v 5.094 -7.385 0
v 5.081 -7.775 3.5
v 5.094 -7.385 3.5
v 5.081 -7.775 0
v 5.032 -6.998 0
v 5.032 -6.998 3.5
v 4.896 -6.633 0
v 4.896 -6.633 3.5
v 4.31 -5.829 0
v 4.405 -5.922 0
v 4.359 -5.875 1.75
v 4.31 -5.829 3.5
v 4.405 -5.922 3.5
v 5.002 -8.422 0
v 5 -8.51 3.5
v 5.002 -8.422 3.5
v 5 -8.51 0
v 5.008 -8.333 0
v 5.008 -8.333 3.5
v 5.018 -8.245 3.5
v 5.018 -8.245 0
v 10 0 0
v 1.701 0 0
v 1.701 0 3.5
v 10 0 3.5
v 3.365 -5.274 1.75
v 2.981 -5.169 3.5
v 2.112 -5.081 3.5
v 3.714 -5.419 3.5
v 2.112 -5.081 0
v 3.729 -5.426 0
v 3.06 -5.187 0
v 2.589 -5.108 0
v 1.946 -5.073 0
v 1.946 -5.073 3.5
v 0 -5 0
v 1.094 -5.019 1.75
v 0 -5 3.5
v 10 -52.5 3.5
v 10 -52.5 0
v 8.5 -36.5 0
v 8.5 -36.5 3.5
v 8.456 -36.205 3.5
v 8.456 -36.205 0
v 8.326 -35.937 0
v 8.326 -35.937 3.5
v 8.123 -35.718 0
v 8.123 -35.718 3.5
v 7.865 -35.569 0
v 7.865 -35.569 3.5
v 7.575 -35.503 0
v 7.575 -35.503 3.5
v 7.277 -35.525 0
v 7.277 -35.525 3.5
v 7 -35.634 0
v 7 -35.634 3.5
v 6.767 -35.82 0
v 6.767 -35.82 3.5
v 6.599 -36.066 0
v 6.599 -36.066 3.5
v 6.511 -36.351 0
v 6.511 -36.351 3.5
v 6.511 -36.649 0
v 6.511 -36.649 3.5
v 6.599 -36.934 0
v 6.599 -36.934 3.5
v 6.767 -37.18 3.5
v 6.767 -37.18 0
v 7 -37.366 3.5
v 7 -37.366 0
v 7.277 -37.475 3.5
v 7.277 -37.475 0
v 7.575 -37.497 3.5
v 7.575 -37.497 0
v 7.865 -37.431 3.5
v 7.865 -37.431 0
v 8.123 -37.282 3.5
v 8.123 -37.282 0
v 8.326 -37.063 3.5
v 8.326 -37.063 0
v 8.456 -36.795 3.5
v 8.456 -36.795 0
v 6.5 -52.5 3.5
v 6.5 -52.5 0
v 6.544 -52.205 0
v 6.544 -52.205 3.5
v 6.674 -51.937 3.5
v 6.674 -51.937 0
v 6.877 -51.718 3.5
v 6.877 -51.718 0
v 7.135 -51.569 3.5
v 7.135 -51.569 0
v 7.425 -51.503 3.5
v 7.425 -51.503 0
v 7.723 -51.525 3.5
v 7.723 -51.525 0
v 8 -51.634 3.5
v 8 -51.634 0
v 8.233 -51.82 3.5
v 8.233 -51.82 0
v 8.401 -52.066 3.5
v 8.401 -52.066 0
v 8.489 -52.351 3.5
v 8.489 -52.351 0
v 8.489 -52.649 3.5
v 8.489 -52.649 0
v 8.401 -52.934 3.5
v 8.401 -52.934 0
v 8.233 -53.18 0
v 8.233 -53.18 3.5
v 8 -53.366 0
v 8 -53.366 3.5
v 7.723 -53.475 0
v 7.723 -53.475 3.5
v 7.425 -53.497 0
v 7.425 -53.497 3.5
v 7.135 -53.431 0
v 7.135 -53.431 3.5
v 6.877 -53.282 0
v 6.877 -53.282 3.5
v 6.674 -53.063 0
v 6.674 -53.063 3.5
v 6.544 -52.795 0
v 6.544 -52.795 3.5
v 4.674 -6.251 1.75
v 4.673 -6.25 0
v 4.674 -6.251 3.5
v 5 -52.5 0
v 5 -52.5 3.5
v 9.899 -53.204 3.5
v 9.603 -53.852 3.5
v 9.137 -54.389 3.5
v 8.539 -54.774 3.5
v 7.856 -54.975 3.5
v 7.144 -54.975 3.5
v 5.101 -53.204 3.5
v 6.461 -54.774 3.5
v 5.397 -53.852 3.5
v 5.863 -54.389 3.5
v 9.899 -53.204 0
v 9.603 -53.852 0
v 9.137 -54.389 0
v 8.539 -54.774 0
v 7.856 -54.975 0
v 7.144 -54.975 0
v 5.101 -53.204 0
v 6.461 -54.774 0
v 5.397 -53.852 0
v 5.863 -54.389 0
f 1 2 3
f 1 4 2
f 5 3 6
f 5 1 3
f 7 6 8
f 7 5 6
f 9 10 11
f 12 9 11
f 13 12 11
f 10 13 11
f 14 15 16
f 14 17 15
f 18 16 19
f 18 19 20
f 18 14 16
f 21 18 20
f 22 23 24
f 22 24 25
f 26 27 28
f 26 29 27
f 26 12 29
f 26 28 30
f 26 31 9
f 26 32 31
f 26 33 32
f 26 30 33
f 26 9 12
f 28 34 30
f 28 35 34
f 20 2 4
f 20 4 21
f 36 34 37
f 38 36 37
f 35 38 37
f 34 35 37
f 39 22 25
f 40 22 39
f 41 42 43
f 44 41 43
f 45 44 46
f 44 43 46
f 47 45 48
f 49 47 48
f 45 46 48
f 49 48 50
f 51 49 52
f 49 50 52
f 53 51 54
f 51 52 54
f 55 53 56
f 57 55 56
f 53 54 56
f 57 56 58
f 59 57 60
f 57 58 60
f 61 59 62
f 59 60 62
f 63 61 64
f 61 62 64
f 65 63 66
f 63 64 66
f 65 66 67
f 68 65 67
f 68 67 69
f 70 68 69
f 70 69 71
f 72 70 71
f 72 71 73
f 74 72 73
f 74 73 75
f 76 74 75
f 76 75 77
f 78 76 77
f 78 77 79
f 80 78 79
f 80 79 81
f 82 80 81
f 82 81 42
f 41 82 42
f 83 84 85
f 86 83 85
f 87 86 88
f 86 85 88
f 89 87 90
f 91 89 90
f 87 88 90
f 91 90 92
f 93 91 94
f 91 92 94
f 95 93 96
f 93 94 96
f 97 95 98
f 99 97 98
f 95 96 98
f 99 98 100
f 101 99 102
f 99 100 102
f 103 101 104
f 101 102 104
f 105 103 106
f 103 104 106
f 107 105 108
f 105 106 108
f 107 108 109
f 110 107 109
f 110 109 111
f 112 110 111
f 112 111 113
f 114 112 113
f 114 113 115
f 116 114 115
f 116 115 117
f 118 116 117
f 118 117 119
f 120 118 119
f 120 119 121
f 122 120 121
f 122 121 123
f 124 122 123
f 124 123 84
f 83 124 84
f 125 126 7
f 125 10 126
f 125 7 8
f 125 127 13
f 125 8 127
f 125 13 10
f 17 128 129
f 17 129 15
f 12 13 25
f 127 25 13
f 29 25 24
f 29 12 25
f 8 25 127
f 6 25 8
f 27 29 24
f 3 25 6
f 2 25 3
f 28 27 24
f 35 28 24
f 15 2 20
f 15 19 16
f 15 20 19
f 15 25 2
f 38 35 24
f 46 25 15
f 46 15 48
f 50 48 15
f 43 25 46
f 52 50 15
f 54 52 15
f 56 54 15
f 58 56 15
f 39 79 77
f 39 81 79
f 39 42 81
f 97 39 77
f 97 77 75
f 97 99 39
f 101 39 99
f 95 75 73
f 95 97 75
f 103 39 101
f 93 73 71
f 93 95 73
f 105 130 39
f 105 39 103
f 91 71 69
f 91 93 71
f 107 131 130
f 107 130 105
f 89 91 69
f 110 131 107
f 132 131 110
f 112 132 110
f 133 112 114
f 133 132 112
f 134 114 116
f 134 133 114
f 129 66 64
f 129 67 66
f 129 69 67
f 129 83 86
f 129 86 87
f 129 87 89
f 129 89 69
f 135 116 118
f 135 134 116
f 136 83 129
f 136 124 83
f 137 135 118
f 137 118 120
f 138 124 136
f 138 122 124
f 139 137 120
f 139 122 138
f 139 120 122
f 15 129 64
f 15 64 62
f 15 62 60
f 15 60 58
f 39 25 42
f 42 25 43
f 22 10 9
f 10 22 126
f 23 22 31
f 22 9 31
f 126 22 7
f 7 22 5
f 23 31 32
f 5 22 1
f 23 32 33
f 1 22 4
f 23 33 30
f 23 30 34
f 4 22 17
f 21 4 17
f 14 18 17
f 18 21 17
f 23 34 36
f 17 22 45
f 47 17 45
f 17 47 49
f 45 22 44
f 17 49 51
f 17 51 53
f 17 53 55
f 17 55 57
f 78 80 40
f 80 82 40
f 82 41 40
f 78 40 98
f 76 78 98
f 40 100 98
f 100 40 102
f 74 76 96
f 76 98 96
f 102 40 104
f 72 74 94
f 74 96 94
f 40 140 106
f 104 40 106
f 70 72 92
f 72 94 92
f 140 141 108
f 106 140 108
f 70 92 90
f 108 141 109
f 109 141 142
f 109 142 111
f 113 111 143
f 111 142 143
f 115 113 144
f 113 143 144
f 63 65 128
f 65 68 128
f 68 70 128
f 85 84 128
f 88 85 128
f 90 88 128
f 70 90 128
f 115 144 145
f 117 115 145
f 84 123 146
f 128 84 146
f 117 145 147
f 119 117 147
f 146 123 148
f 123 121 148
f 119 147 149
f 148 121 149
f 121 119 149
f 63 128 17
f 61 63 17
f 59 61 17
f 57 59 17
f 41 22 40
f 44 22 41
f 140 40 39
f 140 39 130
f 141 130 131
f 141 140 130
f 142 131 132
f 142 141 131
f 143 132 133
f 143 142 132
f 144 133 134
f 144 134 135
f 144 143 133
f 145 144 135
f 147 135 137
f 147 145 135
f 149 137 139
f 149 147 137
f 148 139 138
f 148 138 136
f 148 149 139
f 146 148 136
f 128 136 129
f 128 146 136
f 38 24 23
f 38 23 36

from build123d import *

# Parameters (mm, degrees)
BOSS_EXTRU_1_DEPTH      = 3.5
ESQUISSE3_R             = 1
ENL_V_MAT_EXTRU_1_DEPTH = 4
ESQUISSE4_R             = 1
ENL_V_MAT_EXTRU_2_DEPTH = 10
ENL_V_MAT_EXTRU_3_DEPTH = 57.011159602
CONG_1_SIZE             = 5
CONG_1_SIZE_2           = 3
ENL_V_MAT_EXTRU_7_DEPTH = 6
CONG_4_R                = 2
CONG_5_R                = 2


with BuildPart() as part:
    # Esquisse1 → Boss.-Extru.1 (new body)
    with BuildSketch(Plane.XY):
        with BuildLine():
            Line((0, 0), (10, 0))
            Line((10, 0), (10, -52.5))
            ThreePointArc((10, -52.5), (7.5, -55), (5, -52.5))
            Line((5, -52.5), (5, -5))
            Line((5, -5), (0, -5))
            Line((0, -5), (0, 0))
        make_face()
    extrude(amount=BOSS_EXTRU_1_DEPTH)

    # Esquisse3 → Enlèv. mat.-Extru.1 (cut)
    with BuildSketch(Plane(origin=(0, 0, 0), x_dir=(-1, 0, 0), z_dir=(0, 0, -1))):
        with Locations((-7.5, -52.5)):
            Circle(ESQUISSE3_R)
    extrude(amount=-ENL_V_MAT_EXTRU_1_DEPTH, mode=Mode.SUBTRACT)

    # Esquisse4 → Enlèv. mat.-Extru.2 (cut)
    with BuildSketch(Plane.XY.offset(3.5)):
        with Locations((7.5, -36.5)):
            Circle(ESQUISSE4_R)
    extrude(amount=-ENL_V_MAT_EXTRU_2_DEPTH, mode=Mode.SUBTRACT)

    # Esquisse5 → Enlèv. mat.-Extru.3 (cut, through all)
    with BuildSketch(Plane.XY.offset(3.5)):
        Polygon((0, 0), (1.700931961, 0), (0, -5), align=None)
    extrude(amount=-ENL_V_MAT_EXTRU_3_DEPTH, mode=Mode.SUBTRACT)

    # Congé1
    # a fillet whose section is not a circle: 5, 3 mm, written as the material it adds along each edge
    with BuildSketch(Plane(origin=(5, -5, 0), x_dir=(-1, 0, 0), z_dir=(0, 0, 1))) as cong_1_piece_1_section:
        with BuildLine():
            Bezier((CONG_1_SIZE, 0), (0, 0), (0, CONG_1_SIZE_2), weights=[1, 1.5, 1])
            Line((0, CONG_1_SIZE_2), (0, 0))
            Line((0, 0), (CONG_1_SIZE, 0))
        make_face()
    cong_1_piece_1 = extrude(amount=3.5, mode=Mode.PRIVATE)
    cong_1_piece_1 = split(cong_1_piece_1, bisect_by=Plane(origin=(0.518616131, -3.47549419, 0), z_dir=(0.9467189518296611, -0.32206090456084224, 0)), keep=Keep.TOP, mode=Mode.PRIVATE)
    add(cong_1_piece_1)

    # Esquisse11 → Enlèv. mat.-Extru.7 (cut)
    with BuildSketch(Plane.XY.offset(3.5)):
        with BuildLine():
            Line((5.143373152, -7.30566223), (4.982244072, -8.50993083))
            Line((4.982244072, -8.50993083), (2.030783729, -5.080870965))
            add(Edge.make_bspline(
                [(2.030783729, -5.080870965), (4.543708127, -5.064842627), (5.143373152, -7.30566223)],
                knots=[0, 0, 0, 1, 1, 1], degree=2))
        make_face()
    extrude(amount=-ENL_V_MAT_EXTRU_7_DEPTH, mode=Mode.SUBTRACT)

    # Congé4
    cong_4_edges = [part.edges().sort_by_distance(p)[0] for p in [
        (5, -8.377224145, 1.75),
        (5.143373152, -7.30566223, 1.75),
    ]]
    fillet(cong_4_edges, radius=CONG_4_R)

    # Congé5
    cong_5_edges = [part.edges().sort_by_distance(p)[0] for p in [
        (2.032105754, -5.080862688, 1.75),
    ]]
    fillet(cong_5_edges, radius=CONG_5_R)


solid = part.part
